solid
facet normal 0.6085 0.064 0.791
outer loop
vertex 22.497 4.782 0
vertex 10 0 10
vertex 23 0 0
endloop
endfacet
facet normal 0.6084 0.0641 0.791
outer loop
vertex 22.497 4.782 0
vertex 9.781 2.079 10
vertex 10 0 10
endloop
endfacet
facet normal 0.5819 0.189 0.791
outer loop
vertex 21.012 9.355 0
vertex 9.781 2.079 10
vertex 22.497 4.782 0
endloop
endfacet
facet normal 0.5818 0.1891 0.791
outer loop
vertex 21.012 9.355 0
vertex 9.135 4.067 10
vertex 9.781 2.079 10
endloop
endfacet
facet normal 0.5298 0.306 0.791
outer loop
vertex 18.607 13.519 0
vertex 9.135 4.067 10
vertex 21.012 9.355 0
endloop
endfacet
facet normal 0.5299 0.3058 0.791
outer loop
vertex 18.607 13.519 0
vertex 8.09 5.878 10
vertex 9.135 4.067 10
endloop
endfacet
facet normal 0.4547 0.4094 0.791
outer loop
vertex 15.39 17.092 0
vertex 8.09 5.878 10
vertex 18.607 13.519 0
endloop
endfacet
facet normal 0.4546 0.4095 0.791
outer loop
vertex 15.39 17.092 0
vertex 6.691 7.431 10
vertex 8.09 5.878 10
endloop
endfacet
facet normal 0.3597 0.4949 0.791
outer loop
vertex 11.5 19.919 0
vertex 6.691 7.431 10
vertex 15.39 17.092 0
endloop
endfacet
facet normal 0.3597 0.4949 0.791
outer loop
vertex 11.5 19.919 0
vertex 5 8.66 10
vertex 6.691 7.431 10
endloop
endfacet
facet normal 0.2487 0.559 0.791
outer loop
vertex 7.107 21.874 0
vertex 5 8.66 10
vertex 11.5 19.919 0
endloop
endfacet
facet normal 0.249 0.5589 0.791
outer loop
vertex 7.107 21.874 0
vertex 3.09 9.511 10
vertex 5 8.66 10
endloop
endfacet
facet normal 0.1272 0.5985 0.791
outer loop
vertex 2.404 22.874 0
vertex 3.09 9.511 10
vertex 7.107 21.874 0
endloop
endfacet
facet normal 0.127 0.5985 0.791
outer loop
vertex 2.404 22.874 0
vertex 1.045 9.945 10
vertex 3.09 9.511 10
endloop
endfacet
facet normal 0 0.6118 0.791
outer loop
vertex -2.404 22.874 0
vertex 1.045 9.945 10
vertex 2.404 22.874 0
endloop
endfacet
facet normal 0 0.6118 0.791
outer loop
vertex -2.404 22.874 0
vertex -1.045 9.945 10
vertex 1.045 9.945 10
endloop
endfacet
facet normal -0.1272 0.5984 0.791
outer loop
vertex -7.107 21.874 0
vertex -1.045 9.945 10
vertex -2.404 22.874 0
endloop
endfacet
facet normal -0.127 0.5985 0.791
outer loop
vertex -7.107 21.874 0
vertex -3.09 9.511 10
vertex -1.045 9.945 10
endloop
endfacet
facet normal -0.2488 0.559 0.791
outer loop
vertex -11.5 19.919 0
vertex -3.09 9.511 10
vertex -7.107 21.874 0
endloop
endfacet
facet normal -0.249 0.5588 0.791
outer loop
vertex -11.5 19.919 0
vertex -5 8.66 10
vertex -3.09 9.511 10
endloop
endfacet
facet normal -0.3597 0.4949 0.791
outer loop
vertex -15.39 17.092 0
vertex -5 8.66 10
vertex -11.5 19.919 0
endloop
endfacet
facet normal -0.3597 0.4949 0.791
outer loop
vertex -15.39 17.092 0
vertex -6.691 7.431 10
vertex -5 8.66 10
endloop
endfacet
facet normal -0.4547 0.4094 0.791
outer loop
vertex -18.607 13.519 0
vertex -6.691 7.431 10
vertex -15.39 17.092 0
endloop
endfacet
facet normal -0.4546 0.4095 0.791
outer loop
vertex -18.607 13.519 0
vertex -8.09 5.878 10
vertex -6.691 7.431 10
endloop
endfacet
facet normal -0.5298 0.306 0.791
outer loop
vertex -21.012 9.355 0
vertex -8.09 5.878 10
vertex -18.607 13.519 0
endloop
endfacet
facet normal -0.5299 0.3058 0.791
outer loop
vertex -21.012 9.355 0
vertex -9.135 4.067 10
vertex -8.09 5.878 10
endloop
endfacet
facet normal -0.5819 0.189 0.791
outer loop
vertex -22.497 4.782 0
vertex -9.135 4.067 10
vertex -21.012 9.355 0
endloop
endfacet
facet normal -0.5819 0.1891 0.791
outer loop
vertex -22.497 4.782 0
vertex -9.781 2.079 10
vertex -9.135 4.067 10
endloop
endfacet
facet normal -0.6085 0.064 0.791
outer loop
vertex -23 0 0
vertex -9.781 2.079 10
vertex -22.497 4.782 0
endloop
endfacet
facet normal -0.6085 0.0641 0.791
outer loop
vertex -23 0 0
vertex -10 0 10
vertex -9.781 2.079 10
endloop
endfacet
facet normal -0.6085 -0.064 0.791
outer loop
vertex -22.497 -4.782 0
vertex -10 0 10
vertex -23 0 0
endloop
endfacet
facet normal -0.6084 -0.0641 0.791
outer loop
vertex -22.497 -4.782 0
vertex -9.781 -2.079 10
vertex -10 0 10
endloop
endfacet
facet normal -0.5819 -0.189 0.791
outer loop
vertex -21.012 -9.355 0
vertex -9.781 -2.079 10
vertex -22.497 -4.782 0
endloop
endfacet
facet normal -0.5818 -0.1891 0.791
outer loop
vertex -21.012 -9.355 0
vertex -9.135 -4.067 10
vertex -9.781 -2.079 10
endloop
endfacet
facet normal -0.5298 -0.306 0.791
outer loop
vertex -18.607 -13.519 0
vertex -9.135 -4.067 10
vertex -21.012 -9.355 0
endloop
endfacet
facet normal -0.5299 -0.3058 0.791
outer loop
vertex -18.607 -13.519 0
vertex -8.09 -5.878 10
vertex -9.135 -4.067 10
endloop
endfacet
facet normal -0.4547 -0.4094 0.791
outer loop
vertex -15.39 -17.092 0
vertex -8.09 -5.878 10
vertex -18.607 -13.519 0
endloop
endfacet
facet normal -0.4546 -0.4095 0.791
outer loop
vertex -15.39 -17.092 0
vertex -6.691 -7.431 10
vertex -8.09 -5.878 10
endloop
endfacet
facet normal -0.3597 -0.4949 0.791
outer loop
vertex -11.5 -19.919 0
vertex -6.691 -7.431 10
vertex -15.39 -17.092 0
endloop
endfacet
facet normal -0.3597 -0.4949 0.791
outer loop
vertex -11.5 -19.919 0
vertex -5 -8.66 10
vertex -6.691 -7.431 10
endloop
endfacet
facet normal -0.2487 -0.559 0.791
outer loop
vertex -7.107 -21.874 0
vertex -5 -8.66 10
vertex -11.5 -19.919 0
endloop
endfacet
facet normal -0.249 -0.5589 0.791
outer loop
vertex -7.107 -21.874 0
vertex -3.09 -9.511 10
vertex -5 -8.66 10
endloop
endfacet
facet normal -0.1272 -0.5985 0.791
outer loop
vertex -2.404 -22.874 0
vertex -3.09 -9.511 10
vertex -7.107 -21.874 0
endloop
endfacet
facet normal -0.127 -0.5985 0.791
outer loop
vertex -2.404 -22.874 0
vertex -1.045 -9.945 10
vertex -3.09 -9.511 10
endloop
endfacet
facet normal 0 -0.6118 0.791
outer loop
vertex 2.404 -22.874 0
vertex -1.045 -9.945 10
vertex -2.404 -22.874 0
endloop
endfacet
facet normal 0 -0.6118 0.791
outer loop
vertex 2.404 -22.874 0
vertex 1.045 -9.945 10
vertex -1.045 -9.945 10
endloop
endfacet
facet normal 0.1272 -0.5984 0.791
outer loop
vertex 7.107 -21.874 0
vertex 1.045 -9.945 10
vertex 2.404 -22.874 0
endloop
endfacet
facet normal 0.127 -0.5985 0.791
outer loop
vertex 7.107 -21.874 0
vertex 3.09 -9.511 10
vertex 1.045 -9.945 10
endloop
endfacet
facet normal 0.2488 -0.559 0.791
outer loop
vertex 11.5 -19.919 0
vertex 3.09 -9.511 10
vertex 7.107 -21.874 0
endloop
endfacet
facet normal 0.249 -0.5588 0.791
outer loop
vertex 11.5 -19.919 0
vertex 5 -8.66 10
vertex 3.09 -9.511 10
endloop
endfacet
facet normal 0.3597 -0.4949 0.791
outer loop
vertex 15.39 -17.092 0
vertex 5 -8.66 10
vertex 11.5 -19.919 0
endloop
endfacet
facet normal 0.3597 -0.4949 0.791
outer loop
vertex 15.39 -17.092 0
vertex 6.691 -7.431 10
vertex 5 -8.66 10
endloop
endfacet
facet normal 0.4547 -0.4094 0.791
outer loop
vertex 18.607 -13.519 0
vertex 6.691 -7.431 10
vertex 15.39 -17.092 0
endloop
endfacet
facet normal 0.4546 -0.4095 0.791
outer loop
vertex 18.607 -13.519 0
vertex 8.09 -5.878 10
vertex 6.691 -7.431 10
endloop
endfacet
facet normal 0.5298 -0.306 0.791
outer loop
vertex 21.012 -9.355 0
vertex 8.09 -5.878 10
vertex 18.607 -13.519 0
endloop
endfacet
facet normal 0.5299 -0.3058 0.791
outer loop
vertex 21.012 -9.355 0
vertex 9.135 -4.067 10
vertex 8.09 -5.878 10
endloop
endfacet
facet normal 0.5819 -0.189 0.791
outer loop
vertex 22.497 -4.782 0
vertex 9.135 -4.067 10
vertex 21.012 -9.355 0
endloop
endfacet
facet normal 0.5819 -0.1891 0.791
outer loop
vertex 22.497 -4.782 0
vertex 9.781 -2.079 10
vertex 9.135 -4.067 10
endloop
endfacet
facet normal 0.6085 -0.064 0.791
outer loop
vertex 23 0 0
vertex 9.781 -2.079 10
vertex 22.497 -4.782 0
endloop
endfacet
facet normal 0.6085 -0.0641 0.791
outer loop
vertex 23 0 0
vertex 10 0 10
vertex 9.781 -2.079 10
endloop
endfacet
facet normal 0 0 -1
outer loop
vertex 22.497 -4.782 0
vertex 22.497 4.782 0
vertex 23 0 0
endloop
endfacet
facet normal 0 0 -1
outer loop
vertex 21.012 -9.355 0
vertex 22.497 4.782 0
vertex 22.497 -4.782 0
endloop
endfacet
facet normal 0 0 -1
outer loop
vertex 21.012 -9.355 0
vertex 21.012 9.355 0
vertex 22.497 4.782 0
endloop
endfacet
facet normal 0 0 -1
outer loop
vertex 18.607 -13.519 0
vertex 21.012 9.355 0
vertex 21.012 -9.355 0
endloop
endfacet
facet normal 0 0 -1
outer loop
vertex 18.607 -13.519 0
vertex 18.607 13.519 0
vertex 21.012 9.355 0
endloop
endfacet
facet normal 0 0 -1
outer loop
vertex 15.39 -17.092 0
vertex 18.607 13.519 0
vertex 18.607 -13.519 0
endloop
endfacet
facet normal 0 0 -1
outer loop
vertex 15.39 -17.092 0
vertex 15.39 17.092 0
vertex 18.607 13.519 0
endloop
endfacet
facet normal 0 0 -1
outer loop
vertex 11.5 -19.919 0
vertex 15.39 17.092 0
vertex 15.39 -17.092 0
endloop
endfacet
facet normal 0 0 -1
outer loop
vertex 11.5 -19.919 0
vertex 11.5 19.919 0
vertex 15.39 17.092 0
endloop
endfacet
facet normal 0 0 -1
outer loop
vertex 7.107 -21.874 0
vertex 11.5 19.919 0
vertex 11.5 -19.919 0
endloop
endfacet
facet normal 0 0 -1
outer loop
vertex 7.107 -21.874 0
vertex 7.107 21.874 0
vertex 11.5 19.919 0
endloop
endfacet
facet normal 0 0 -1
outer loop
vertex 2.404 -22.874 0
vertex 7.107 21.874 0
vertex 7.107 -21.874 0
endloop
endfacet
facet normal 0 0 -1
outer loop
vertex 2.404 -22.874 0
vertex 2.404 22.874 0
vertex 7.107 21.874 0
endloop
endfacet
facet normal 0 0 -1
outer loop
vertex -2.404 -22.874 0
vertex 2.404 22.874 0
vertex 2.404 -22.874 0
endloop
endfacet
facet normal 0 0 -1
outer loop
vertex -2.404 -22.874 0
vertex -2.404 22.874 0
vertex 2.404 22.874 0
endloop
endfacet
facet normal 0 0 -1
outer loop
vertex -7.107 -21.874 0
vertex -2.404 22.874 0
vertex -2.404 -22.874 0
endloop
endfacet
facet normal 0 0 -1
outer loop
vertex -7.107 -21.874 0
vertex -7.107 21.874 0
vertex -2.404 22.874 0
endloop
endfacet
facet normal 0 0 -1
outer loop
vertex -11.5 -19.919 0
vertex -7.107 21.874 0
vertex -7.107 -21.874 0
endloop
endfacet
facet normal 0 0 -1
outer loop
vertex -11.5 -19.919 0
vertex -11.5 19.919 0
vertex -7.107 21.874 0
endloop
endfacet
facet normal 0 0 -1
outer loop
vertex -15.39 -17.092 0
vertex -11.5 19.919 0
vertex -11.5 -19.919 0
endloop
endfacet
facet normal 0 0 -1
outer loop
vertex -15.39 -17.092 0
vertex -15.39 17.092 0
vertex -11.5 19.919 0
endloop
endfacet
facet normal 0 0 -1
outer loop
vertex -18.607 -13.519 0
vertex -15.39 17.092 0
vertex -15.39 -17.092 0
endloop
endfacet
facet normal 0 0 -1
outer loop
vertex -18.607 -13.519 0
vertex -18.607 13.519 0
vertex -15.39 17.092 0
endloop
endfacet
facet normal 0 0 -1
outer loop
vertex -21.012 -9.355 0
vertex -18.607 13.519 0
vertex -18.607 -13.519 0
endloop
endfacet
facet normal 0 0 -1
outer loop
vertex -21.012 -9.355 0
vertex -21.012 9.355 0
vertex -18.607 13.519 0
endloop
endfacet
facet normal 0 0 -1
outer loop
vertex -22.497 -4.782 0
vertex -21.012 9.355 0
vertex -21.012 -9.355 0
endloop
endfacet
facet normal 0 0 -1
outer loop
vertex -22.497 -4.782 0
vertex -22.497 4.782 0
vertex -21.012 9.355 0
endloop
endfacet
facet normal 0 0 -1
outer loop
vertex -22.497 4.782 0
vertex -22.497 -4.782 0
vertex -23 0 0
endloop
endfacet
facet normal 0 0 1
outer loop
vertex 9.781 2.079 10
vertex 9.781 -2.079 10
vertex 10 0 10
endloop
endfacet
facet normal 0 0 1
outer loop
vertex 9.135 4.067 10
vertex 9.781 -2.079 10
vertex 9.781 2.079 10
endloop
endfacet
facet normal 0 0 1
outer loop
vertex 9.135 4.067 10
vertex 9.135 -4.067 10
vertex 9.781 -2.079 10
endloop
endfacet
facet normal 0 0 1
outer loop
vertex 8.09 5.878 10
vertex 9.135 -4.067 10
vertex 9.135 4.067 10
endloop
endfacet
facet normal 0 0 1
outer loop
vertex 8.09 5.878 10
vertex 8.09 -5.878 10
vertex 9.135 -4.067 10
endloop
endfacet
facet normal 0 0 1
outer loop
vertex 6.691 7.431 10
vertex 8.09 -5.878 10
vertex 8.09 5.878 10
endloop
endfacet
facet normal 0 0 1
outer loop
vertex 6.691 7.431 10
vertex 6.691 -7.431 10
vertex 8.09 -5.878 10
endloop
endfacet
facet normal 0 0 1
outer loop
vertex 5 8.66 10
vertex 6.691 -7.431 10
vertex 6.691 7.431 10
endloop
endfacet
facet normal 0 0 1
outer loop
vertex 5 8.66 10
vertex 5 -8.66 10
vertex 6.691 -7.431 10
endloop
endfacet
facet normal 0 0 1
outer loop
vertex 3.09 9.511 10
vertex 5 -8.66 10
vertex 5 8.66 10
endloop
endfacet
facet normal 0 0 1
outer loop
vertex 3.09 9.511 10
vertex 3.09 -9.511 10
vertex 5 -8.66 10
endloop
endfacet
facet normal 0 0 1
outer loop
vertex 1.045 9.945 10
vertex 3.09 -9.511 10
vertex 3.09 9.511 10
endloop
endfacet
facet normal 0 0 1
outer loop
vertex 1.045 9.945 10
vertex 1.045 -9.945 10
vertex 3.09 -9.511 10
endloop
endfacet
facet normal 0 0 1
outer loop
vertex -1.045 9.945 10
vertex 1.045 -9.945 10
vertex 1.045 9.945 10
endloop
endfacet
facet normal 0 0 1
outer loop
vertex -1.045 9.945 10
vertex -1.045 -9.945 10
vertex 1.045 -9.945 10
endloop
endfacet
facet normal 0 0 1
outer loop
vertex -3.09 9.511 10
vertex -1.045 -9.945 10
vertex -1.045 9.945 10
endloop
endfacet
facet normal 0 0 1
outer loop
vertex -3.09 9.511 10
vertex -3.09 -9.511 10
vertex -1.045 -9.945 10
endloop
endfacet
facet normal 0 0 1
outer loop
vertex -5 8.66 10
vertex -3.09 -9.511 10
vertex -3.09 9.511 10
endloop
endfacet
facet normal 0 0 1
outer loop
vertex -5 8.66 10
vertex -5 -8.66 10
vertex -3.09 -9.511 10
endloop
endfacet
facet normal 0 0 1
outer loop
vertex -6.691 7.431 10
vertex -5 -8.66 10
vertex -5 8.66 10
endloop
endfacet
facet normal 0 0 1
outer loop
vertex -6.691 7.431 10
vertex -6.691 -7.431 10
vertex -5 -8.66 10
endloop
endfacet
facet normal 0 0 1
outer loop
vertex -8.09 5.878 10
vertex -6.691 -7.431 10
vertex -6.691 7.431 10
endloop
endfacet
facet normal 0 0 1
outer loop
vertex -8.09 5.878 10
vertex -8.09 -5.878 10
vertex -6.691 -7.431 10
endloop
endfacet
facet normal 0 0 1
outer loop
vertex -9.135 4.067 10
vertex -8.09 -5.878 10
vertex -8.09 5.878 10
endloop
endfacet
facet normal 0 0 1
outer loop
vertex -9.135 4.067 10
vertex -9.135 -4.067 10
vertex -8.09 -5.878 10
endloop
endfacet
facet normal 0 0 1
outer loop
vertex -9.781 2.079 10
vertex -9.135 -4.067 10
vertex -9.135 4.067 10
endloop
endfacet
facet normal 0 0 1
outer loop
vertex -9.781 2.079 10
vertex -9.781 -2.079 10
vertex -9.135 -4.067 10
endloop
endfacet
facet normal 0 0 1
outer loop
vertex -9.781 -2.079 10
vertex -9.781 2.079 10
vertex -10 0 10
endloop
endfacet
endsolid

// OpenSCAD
module mymodule(modparam) {
  inner_variable = 23;
  inner_variable2 = modparam * 2;
  cylinder(r1=inner_variable, r2=inner_variable2, h=10);
}

mymodule(5);
